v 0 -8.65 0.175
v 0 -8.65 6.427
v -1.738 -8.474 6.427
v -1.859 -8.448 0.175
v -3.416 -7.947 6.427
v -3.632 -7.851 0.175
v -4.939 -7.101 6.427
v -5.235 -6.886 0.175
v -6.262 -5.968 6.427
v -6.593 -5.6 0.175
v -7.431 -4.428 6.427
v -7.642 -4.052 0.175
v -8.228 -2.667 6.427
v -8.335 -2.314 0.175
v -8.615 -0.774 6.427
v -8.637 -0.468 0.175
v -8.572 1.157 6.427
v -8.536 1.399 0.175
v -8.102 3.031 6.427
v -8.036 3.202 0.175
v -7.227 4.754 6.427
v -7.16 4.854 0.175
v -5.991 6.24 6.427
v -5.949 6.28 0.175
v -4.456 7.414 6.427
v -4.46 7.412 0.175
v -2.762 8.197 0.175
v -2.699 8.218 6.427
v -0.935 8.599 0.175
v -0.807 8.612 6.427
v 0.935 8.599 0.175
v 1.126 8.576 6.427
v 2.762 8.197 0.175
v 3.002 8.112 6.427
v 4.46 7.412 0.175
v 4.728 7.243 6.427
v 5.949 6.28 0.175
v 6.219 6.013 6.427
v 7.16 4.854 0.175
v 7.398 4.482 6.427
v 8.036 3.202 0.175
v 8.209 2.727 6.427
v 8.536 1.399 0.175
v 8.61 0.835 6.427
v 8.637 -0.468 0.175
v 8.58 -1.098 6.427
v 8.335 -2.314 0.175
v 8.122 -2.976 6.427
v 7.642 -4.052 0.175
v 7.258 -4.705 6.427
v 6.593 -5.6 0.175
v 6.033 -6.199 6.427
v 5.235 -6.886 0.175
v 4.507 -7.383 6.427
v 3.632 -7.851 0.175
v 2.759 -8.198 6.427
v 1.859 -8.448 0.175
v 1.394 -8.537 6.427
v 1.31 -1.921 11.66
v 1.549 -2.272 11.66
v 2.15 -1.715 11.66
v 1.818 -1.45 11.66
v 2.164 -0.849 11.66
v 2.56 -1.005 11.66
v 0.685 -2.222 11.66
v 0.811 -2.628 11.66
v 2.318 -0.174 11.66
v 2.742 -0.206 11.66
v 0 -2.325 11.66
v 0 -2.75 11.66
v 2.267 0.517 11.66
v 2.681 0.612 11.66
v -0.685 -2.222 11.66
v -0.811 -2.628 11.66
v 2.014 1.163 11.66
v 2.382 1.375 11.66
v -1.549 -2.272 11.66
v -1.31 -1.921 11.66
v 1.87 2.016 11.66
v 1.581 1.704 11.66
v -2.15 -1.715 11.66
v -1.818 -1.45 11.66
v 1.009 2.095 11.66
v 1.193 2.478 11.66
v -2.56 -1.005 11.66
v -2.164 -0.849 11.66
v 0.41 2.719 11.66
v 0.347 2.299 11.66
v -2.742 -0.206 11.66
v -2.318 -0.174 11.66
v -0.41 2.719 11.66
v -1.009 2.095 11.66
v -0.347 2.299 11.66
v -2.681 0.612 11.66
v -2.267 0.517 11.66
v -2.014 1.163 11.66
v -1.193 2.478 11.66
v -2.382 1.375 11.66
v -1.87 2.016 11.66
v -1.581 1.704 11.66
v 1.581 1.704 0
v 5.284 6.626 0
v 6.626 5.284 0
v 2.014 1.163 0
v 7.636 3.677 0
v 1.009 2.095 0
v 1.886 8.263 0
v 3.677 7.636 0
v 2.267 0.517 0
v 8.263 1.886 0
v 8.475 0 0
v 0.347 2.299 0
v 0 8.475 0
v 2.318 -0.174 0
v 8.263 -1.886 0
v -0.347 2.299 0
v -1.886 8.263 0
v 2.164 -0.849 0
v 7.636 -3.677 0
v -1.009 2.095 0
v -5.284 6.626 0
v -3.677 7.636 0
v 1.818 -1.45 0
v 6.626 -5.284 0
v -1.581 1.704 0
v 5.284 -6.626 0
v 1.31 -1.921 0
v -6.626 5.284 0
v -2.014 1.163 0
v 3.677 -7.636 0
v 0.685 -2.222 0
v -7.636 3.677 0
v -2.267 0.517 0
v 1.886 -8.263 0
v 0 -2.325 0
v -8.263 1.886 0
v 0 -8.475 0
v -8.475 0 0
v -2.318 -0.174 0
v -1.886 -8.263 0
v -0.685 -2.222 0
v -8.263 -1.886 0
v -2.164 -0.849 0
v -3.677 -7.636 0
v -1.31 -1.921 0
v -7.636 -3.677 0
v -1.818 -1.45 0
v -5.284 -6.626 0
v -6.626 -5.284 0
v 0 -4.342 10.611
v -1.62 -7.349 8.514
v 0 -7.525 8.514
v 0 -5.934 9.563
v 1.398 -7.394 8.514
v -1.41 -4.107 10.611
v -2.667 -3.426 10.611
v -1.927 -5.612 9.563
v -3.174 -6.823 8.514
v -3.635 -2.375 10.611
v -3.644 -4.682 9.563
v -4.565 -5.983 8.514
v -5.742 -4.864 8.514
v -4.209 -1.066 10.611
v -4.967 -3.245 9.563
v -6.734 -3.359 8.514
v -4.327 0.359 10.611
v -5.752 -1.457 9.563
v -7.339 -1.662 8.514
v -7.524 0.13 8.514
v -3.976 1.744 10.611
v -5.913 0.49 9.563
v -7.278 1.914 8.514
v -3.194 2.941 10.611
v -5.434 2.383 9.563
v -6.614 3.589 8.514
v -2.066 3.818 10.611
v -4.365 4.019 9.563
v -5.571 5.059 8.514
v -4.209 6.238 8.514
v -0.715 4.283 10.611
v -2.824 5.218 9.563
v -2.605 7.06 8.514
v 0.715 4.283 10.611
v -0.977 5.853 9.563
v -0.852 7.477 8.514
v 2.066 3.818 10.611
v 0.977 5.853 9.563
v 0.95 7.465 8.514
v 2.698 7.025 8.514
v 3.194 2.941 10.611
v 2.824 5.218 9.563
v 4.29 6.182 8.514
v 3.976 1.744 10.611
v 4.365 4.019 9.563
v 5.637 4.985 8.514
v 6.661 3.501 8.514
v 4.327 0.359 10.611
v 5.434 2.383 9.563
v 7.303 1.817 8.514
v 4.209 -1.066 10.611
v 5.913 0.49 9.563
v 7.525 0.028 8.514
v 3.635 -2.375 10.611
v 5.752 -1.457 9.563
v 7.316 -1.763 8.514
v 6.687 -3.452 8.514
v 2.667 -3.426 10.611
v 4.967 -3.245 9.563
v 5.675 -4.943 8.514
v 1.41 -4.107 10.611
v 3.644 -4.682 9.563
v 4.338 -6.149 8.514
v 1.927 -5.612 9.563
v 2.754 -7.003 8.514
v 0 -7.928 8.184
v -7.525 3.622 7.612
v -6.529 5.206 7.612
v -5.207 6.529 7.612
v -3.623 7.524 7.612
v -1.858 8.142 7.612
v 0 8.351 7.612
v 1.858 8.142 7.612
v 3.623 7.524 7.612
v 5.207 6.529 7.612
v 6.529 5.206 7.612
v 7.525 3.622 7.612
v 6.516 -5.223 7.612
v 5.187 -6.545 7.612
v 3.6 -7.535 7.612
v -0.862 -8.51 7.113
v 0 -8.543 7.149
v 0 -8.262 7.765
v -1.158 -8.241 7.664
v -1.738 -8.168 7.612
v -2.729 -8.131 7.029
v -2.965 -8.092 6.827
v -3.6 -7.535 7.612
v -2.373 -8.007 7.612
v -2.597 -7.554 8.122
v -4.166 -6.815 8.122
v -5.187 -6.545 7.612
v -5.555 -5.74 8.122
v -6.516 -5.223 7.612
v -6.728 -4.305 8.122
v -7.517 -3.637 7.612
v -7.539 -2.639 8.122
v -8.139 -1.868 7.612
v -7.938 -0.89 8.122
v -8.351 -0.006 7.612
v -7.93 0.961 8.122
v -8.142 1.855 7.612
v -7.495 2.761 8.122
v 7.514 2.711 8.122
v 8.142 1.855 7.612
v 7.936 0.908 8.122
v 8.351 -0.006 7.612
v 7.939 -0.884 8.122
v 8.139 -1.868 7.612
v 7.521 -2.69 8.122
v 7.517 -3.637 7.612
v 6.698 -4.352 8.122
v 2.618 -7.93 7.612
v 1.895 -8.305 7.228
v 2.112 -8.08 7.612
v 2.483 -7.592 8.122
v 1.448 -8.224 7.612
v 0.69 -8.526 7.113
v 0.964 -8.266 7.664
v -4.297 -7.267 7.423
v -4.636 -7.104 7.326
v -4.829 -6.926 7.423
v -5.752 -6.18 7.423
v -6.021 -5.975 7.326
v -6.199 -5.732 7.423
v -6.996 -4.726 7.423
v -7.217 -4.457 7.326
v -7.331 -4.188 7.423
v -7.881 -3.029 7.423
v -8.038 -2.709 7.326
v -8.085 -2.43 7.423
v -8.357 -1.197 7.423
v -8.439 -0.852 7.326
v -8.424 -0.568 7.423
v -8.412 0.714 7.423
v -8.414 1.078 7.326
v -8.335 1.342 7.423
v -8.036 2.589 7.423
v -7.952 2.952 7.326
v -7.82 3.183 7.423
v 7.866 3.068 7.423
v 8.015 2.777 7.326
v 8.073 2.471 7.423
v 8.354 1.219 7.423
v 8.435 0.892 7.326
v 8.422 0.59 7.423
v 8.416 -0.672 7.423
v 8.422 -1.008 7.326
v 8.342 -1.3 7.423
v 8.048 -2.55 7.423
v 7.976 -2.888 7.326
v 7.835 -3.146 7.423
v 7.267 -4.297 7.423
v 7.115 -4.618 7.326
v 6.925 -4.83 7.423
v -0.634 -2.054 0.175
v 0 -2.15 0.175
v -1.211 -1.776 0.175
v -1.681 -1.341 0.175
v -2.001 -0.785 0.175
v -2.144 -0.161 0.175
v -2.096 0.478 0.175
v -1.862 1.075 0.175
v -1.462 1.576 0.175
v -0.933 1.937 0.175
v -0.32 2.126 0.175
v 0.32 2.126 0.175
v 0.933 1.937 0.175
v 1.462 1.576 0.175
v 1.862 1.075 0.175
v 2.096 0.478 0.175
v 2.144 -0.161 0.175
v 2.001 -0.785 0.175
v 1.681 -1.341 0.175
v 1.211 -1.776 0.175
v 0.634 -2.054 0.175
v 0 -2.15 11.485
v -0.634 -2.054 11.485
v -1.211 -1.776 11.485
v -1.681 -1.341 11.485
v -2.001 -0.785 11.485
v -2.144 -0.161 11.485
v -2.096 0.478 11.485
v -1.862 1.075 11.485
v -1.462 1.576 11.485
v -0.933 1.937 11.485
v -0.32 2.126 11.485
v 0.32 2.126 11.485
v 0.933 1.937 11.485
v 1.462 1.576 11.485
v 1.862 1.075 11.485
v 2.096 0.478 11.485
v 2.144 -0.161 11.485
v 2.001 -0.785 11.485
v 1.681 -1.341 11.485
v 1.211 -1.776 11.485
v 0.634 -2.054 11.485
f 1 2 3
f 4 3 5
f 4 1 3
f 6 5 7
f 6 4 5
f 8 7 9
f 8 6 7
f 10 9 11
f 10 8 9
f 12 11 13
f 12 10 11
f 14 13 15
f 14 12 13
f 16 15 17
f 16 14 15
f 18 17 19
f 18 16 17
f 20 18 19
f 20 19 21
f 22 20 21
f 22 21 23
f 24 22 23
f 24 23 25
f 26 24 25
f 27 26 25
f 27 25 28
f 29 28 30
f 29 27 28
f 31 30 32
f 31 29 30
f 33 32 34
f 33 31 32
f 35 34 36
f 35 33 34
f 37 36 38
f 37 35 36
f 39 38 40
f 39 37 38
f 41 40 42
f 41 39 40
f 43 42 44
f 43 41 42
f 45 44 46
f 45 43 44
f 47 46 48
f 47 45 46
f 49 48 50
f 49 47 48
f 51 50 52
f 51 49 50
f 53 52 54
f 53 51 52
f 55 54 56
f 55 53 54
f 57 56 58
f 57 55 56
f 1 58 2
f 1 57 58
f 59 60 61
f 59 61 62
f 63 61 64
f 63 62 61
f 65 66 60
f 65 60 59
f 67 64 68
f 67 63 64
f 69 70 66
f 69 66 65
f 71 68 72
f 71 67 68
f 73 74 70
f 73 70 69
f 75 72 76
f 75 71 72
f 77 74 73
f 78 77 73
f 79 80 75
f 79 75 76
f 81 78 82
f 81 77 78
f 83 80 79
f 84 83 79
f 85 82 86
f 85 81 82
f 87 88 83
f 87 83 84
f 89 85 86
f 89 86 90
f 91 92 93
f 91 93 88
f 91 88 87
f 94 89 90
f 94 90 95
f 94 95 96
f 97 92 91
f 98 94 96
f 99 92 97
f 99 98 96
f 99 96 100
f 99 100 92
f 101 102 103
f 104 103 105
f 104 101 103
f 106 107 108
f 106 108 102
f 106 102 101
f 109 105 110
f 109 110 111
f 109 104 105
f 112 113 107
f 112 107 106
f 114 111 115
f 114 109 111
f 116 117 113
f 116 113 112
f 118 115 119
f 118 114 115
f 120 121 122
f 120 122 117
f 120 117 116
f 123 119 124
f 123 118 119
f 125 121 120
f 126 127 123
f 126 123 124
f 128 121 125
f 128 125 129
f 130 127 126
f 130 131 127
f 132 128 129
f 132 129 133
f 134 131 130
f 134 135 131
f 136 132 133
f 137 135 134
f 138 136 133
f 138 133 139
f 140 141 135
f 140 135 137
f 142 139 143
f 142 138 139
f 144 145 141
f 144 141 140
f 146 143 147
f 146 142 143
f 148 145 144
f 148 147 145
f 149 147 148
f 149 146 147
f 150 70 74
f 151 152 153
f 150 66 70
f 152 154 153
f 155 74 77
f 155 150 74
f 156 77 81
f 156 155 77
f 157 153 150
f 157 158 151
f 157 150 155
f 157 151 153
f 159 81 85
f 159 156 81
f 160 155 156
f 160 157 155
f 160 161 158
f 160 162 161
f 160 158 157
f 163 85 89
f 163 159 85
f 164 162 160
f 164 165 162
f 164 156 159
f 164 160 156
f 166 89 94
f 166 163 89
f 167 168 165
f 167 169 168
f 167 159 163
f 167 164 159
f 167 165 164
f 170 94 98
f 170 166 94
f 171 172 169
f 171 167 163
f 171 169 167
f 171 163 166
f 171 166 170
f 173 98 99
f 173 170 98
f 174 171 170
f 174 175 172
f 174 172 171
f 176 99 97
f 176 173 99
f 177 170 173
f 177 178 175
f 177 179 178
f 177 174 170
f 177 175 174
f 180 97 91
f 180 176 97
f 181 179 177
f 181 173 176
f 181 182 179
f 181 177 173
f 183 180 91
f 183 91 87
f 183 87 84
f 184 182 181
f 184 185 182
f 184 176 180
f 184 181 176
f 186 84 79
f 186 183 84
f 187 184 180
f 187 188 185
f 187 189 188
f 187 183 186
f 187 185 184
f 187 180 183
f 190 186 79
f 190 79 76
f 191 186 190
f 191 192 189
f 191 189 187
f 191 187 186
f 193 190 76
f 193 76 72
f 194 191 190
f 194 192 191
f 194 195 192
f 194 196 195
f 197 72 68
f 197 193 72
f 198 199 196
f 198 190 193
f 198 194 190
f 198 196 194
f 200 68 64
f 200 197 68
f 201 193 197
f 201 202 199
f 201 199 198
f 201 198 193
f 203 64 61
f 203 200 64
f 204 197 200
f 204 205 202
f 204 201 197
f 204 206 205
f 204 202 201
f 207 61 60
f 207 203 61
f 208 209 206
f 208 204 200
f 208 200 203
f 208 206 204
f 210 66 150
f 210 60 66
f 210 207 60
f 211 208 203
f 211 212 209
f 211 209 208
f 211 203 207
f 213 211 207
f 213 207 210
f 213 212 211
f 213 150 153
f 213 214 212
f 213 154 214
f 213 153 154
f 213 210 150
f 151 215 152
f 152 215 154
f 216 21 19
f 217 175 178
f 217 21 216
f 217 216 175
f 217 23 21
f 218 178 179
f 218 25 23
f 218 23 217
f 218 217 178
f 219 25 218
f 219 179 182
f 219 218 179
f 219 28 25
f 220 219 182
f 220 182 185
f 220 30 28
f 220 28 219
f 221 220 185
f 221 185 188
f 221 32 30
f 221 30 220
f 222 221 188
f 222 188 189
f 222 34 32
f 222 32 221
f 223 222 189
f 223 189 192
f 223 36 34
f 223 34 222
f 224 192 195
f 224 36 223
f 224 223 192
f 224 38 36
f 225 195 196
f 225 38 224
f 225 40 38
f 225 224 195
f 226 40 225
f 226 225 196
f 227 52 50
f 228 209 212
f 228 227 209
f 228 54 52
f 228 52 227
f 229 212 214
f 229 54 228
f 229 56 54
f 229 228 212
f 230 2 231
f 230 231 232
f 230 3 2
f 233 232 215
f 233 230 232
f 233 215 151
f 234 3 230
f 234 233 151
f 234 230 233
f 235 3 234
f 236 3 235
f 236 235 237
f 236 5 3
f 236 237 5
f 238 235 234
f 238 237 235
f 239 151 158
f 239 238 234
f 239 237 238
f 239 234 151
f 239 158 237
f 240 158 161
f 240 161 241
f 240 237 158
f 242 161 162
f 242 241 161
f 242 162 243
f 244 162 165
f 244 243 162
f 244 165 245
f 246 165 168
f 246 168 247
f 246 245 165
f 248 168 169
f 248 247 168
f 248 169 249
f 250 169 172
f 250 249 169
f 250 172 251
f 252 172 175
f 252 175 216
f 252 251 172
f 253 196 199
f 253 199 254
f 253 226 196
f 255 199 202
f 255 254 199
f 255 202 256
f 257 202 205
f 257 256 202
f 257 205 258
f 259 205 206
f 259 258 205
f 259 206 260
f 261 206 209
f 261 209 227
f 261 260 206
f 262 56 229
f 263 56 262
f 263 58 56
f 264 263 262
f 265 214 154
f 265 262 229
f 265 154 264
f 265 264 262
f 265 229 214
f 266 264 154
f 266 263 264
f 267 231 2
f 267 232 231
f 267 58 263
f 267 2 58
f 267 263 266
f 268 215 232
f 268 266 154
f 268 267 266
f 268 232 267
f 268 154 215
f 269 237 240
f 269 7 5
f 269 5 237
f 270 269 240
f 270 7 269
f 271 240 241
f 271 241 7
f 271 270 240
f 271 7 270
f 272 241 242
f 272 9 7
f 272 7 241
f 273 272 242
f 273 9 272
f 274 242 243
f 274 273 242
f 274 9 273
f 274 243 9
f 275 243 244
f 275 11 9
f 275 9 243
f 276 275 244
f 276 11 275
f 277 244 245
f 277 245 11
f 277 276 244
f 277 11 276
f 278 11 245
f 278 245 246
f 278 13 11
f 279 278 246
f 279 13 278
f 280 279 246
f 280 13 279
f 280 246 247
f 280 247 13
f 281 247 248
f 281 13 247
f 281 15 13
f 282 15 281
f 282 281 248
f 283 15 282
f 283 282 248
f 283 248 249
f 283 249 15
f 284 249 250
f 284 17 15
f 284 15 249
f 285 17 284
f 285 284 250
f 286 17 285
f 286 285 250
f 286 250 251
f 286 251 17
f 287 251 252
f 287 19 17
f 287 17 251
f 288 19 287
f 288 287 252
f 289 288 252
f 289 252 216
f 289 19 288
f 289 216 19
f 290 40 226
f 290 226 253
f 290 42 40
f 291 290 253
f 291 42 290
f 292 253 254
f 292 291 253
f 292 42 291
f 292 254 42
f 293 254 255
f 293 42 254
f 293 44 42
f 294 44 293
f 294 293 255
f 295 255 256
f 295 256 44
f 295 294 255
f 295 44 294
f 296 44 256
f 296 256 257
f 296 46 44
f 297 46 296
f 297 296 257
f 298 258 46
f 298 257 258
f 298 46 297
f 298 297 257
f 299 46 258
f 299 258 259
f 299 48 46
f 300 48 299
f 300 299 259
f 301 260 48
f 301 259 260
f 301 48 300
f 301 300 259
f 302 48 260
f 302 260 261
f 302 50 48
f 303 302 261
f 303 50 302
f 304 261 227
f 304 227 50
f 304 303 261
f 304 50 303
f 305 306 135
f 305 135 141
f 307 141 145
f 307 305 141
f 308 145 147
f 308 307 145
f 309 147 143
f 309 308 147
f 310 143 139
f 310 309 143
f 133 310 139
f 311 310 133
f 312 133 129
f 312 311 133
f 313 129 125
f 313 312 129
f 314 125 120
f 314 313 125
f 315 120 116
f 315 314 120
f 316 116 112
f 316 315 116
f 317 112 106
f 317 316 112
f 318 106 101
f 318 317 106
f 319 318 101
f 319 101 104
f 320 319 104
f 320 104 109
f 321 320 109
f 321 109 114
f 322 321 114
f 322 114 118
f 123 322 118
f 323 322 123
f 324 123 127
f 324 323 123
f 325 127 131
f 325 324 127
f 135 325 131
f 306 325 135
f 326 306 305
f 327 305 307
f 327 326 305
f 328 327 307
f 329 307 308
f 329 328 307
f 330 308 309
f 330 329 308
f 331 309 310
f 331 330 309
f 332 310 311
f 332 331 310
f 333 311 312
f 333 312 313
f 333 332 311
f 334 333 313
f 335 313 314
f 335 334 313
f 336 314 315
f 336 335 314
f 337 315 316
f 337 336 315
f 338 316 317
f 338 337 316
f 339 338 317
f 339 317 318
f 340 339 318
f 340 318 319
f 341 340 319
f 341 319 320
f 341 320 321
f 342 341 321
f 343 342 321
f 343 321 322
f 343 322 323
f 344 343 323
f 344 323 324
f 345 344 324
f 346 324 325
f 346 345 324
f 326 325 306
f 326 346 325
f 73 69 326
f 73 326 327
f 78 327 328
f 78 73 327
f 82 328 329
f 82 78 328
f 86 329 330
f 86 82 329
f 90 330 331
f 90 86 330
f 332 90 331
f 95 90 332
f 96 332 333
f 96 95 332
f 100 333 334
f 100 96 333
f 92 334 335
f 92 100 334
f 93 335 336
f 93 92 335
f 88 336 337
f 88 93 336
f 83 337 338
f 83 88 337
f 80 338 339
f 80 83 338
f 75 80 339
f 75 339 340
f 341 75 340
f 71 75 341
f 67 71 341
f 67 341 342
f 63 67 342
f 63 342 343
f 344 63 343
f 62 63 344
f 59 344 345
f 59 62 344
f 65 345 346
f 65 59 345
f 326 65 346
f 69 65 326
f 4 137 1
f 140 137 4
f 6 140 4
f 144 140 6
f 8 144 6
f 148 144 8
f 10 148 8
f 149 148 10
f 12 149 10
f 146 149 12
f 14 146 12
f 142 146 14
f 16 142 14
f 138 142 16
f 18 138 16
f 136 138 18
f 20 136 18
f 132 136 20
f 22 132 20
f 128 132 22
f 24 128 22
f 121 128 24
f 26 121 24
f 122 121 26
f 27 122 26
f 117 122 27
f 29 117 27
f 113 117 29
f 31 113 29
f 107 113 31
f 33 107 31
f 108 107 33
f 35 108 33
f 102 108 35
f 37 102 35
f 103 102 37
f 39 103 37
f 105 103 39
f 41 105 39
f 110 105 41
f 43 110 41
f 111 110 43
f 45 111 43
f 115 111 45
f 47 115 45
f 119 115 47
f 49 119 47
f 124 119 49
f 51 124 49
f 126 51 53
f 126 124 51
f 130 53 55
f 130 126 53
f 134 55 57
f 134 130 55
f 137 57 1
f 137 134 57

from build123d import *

# Parameters (mm, degrees)
F2_SIZE = 0.175
F3_R    = 2.5


with BuildPart() as f1:
    # F0 (on Right) → F1 (revolve)
    with BuildSketch(Plane.YZ):
        Polygon((-8.65, 7.773333), (-8.65, 0), (-2.15, 0), (-2.15, 11.66), (-2.75, 11.66), align=None)
    revolve(axis=Axis((0, 0, 8.606664), (0, 0, -1)))

    # F2
    f2_edges = [f1.edges().sort_by_distance(p)[0] for p in [
        (0, 2.15, 11.66),
        (0, 8.65, 0),
        (0, 2.15, 0),
    ]]
    chamfer(f2_edges, length=F2_SIZE)

    # F3
    f3_edges = [f1.edges().sort_by_distance(p)[0] for p in [
        (0, 8.65, 7.773333),
    ]]
    fillet(f3_edges, radius=F3_R)


solid = f1.part
